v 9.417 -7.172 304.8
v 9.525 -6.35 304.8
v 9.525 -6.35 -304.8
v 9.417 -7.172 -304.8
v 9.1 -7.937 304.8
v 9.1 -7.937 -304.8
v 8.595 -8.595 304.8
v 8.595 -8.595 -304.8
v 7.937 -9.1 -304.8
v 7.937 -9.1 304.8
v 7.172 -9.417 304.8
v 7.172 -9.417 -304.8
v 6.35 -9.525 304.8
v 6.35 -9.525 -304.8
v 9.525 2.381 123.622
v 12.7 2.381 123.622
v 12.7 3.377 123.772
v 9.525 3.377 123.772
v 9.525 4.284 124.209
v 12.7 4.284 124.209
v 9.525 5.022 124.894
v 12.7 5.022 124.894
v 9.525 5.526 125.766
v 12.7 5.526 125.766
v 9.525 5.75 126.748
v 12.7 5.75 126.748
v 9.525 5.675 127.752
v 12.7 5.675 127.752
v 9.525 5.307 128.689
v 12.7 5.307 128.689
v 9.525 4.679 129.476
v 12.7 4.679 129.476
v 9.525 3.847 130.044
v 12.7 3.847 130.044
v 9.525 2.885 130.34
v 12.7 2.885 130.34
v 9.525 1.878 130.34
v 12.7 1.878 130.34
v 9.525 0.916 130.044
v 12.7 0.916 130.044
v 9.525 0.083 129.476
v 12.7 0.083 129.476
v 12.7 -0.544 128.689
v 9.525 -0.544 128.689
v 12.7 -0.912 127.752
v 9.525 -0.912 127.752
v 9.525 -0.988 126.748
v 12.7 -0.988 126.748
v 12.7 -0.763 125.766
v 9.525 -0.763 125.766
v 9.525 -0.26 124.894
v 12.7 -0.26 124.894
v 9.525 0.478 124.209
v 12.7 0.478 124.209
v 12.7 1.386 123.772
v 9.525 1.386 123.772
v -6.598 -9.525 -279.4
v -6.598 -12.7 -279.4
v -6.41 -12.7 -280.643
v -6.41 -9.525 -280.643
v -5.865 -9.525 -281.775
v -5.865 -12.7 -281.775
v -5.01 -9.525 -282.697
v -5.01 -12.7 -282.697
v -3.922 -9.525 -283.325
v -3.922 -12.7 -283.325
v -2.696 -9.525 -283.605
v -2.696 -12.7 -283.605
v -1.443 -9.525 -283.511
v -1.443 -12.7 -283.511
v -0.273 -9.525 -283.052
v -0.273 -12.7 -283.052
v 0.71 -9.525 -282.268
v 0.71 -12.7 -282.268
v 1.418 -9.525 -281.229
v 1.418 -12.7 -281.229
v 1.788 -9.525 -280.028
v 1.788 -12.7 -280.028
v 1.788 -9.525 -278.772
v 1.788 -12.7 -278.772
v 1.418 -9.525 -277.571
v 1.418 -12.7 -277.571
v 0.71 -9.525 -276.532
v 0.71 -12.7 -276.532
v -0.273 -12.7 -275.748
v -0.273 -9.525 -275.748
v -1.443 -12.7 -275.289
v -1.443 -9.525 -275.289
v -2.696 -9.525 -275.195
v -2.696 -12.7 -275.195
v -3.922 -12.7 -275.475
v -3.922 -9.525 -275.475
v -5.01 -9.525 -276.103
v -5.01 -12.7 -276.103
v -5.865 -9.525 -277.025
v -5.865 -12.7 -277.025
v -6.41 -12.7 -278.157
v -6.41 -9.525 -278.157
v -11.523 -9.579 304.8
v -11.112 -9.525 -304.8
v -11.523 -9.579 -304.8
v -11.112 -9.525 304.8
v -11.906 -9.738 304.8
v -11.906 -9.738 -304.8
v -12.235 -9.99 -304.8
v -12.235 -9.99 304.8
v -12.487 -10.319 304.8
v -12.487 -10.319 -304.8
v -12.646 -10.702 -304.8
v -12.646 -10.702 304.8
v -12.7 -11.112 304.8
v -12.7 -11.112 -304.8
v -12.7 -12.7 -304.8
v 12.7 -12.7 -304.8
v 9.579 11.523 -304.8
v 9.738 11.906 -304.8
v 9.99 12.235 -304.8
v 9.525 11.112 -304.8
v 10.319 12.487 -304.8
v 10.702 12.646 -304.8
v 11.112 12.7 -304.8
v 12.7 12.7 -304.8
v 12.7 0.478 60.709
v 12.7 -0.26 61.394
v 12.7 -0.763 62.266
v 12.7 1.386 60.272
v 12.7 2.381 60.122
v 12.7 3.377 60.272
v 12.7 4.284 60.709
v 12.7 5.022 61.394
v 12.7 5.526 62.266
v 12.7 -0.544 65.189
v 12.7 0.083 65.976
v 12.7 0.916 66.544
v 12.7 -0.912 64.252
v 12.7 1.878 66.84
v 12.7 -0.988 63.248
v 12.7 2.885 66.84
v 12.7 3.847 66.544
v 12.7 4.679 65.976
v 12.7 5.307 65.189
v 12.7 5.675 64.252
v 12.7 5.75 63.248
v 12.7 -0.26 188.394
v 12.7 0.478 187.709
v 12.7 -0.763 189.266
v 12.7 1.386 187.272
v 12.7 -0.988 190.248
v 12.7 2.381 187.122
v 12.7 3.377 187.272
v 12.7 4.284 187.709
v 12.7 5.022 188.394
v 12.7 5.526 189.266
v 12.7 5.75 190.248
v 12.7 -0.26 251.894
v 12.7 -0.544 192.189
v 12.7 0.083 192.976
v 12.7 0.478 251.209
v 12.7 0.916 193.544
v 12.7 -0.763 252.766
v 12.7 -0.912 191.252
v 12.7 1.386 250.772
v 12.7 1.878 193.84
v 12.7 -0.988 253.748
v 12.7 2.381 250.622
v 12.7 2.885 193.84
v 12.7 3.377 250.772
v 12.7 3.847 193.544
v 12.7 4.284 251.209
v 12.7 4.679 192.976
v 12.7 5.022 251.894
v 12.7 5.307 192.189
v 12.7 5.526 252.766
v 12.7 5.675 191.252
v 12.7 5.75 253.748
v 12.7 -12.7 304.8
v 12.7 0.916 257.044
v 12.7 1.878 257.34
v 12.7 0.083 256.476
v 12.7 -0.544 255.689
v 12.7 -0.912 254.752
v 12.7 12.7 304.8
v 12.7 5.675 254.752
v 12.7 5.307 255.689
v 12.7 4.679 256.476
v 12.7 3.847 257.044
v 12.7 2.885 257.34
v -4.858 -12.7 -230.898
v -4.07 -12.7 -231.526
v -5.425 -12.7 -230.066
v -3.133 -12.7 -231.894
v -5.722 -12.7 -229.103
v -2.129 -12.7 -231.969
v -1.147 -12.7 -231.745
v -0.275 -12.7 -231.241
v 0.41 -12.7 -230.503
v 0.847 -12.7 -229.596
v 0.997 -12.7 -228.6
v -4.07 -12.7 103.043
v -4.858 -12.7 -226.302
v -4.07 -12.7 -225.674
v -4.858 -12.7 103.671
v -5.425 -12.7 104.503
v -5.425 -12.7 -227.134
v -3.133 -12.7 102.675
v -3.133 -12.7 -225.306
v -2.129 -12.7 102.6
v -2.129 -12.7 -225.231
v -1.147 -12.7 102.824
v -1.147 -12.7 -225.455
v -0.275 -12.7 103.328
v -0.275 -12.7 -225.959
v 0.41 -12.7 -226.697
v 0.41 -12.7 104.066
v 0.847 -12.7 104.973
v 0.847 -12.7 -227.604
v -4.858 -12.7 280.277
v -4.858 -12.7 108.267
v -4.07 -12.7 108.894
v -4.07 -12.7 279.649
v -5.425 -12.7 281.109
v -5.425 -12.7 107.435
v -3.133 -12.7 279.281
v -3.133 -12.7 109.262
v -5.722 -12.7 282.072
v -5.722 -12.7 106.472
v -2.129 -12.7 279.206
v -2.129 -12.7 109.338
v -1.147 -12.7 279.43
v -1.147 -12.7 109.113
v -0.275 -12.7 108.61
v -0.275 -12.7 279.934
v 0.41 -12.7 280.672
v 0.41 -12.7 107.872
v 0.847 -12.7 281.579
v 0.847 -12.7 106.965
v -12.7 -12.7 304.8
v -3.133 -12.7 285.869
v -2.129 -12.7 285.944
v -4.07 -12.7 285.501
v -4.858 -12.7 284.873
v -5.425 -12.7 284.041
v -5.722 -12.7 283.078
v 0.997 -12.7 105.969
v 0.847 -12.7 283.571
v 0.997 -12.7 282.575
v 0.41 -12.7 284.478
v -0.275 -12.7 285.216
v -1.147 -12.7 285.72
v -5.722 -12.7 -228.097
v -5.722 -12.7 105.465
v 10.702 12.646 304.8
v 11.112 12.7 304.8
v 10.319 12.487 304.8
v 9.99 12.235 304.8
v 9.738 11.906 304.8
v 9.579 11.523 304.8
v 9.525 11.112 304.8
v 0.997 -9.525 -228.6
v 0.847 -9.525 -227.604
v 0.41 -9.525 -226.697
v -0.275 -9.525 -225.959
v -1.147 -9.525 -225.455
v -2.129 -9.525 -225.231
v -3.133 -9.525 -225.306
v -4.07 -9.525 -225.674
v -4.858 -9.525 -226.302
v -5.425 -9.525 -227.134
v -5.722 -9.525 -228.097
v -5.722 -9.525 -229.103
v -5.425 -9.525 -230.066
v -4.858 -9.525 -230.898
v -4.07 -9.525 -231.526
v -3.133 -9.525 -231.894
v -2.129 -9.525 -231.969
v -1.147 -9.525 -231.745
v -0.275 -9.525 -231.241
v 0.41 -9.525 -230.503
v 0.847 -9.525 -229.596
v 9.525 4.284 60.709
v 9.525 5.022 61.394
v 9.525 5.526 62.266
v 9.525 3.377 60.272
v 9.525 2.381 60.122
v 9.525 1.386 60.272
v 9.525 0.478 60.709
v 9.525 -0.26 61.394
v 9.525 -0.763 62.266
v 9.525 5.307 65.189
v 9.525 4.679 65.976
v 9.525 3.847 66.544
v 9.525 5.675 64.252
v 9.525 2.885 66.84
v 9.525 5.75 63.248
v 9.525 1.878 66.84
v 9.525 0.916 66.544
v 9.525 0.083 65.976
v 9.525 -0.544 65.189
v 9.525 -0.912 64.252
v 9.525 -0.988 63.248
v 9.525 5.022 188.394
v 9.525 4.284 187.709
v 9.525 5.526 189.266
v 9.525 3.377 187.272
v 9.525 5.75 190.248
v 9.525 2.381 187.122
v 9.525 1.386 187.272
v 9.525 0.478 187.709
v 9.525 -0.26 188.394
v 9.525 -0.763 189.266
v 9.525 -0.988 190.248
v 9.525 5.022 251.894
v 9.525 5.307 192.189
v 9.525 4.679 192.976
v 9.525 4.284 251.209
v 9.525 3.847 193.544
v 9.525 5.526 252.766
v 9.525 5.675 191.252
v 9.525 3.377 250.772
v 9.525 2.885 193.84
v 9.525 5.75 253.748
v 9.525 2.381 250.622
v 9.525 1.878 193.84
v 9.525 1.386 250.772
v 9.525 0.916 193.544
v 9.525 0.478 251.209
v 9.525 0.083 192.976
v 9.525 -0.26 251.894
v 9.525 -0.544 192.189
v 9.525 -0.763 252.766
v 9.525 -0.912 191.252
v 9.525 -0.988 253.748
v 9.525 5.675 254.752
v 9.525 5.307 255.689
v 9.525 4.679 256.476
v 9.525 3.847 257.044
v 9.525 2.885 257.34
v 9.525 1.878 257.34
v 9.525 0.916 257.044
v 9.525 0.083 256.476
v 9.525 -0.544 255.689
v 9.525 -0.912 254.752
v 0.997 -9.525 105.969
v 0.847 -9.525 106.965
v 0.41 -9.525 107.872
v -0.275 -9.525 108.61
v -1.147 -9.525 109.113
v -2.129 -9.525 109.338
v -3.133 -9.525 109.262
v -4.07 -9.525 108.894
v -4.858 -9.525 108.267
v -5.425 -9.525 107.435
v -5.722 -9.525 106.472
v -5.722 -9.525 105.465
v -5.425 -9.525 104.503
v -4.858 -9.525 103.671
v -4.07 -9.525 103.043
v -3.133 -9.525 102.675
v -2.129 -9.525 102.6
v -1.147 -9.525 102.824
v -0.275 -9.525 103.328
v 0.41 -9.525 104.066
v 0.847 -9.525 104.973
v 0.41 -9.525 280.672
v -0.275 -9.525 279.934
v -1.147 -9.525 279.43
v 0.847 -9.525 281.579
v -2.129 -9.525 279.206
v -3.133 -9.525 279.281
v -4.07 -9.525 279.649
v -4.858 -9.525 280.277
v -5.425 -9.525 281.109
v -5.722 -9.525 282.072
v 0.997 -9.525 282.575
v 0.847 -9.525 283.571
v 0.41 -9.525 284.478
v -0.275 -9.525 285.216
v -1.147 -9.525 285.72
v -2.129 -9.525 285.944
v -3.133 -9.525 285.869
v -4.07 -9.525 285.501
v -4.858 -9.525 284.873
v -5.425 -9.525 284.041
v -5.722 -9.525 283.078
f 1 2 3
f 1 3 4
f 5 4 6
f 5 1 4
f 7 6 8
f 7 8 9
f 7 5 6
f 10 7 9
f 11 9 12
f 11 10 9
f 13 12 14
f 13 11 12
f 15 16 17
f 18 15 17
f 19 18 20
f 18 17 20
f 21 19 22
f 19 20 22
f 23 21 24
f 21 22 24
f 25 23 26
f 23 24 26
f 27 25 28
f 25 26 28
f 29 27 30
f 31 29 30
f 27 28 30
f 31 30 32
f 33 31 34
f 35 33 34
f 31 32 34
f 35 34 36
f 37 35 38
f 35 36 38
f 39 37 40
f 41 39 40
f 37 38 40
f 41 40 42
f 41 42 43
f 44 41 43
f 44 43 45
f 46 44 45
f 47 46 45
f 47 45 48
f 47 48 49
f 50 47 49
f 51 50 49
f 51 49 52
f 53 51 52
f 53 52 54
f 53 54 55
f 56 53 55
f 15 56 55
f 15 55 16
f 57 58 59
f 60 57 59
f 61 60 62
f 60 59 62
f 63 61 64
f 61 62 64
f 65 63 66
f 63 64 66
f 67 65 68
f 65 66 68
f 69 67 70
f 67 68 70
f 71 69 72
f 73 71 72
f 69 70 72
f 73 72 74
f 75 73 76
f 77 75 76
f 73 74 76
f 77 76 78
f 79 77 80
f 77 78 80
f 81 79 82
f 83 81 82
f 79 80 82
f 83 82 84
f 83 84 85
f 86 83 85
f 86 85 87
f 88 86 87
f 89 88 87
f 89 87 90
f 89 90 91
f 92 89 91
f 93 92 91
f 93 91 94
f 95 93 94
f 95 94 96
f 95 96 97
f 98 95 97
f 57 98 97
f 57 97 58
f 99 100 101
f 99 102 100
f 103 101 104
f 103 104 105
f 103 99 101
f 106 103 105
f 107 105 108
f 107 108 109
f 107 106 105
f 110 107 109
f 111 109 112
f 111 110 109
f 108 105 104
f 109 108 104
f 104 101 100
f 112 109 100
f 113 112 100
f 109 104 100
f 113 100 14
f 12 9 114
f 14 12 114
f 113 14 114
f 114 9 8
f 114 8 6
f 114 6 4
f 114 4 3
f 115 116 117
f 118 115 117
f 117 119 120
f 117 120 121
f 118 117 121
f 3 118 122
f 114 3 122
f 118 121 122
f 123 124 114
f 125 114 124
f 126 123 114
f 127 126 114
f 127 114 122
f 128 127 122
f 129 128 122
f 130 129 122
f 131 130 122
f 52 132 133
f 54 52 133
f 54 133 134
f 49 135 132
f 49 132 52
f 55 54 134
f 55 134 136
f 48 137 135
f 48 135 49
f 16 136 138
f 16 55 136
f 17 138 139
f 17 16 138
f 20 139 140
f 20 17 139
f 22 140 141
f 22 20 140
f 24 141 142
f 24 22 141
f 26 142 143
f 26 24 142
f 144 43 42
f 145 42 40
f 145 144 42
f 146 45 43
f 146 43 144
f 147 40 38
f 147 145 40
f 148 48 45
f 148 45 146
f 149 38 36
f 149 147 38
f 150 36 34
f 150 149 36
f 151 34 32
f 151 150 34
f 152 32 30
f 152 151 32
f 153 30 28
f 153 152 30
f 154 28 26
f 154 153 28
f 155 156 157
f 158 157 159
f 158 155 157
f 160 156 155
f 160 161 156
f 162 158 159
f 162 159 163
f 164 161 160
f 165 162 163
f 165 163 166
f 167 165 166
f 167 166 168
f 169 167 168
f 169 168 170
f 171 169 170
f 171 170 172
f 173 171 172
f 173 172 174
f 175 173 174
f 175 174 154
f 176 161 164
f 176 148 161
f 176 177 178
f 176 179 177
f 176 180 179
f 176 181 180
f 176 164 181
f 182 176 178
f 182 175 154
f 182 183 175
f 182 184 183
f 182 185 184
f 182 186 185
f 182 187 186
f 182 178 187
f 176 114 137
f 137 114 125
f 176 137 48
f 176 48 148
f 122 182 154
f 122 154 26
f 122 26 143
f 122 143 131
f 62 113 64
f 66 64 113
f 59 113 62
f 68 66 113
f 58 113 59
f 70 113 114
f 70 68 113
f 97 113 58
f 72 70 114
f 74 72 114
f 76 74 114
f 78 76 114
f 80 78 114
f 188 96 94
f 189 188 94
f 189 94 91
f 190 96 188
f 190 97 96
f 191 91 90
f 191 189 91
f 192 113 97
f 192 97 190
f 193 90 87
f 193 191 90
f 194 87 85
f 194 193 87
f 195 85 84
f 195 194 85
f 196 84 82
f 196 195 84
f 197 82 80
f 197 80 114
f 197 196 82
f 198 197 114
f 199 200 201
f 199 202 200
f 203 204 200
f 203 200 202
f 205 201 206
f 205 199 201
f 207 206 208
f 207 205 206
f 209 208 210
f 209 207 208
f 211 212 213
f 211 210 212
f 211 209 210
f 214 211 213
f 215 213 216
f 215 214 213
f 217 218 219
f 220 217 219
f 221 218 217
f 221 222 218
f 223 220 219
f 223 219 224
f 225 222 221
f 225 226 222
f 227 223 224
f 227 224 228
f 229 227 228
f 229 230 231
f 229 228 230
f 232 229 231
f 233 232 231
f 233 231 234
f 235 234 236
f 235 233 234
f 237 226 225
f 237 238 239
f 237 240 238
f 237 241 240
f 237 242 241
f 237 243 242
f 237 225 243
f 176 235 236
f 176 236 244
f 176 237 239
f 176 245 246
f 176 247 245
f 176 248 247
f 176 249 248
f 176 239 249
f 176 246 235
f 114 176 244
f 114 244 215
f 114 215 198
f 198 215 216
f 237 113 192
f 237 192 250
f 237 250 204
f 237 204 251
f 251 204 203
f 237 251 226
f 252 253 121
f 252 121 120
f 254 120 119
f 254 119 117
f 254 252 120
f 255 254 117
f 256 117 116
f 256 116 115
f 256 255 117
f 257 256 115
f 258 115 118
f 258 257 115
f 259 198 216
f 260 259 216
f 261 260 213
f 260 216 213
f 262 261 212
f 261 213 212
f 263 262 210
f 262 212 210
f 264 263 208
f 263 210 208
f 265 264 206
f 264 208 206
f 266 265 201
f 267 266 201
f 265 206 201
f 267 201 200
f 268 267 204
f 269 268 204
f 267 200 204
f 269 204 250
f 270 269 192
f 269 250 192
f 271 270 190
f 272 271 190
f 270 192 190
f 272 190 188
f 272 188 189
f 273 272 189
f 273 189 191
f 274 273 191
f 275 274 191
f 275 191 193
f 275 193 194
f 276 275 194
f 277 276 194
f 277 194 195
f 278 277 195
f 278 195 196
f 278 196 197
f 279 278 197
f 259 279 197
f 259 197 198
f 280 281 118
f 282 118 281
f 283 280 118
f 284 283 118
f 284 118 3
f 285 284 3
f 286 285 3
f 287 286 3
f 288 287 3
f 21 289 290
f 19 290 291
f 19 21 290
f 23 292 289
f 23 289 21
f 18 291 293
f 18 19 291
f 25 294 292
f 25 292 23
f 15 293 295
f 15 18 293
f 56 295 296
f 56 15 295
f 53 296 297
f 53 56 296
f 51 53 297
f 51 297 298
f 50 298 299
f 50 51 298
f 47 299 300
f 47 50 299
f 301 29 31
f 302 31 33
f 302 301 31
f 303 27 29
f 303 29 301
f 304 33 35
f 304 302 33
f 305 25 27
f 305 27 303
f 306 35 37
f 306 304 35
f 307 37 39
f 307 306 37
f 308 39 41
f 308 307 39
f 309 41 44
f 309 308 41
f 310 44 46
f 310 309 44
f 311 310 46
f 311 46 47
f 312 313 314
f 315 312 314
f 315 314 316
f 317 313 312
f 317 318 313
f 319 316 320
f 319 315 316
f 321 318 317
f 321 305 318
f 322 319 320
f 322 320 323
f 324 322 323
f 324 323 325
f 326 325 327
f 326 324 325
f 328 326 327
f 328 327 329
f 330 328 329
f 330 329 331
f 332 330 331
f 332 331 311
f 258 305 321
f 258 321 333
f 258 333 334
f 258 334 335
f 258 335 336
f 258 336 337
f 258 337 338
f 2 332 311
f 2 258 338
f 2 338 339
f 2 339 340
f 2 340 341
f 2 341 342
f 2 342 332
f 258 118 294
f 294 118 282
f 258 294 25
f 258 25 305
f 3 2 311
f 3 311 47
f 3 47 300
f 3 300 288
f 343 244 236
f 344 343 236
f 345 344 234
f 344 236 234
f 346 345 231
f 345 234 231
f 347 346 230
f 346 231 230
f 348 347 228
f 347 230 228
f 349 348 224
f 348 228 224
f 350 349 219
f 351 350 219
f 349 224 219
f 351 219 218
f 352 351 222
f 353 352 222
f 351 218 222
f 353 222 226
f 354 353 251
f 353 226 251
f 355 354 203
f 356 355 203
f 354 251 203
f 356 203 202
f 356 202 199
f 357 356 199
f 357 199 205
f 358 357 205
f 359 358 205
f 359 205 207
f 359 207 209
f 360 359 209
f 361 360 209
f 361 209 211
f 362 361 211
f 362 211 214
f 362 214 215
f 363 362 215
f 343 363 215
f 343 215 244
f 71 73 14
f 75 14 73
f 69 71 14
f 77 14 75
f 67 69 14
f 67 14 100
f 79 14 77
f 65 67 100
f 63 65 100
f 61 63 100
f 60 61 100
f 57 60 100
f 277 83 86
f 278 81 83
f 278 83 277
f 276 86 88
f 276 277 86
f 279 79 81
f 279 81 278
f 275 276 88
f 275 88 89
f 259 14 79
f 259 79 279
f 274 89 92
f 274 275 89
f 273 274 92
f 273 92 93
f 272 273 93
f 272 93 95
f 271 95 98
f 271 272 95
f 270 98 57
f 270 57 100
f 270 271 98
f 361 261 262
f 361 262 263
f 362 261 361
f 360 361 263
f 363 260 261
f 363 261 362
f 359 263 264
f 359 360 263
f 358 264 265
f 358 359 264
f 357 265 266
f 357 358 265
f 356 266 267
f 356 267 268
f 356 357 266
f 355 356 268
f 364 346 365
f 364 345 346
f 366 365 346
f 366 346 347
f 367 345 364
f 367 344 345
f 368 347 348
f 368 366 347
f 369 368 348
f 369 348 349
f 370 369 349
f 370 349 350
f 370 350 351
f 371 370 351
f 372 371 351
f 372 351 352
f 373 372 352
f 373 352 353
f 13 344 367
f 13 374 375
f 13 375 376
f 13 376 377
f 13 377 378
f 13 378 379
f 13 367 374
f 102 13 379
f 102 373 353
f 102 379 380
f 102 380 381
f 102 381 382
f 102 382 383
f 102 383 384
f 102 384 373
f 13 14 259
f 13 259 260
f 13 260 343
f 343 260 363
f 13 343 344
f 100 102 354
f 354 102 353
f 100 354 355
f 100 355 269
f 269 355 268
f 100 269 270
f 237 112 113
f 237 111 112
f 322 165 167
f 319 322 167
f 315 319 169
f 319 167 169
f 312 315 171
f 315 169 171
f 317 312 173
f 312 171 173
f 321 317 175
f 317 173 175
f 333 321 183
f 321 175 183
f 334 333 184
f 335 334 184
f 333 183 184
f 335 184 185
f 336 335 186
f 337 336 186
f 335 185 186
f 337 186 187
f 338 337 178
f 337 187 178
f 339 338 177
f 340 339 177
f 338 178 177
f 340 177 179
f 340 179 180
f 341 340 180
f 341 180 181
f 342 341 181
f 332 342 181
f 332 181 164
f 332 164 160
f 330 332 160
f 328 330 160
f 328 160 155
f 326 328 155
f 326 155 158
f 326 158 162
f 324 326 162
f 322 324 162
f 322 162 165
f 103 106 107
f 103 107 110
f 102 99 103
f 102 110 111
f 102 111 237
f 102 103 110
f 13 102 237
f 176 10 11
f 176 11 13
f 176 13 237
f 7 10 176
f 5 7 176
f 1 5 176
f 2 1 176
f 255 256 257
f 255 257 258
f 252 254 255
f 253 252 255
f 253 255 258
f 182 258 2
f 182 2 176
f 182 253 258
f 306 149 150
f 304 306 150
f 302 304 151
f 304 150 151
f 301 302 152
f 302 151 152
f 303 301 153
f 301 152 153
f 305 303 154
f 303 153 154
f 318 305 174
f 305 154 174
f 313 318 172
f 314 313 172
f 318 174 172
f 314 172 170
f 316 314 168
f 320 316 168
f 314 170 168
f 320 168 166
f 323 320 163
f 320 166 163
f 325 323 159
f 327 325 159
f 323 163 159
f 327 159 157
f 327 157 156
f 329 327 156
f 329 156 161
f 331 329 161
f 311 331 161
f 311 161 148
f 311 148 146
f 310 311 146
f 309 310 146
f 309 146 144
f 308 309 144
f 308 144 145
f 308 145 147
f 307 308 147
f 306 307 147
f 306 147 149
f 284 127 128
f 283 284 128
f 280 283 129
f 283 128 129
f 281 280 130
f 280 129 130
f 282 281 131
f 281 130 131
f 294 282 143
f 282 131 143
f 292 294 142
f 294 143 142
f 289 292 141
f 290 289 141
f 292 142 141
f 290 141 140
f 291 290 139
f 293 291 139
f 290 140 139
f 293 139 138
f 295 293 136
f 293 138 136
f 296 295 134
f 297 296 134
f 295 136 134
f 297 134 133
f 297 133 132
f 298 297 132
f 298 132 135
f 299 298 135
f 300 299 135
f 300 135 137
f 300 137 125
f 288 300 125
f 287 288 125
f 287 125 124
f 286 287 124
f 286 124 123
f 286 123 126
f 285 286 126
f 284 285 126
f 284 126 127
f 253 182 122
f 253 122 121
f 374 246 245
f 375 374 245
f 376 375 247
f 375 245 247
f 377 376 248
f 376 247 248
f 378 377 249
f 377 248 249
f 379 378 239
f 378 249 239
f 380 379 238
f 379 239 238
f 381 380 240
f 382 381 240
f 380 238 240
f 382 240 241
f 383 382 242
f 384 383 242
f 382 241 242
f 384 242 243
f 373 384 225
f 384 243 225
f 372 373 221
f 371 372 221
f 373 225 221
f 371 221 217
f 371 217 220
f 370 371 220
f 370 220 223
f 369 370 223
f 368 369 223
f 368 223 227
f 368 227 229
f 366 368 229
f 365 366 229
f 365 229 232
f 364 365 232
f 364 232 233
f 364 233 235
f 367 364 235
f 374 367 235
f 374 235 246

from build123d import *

# Parameters (mm, degrees)
BOSS_EXTRUDE1_DEPTH      = 304.8
F_1_4_CLEARANCE_HOLE1_D  = 6.7564
F_1_4_CLEARANCE_HOLE2_D  = 6.7564
F_5_16_CLEARANCE_HOLE1_D = 8.4328


with BuildPart() as part:
    # Sketch2 → Boss-Extrude1 (new, symmetric)
    with BuildSketch(Plane.XY):
        with BuildLine():
            Line((-12.7, -12.7), (12.7, -12.7))
            Line((12.7, -12.7), (12.7, 12.7))
            Line((12.7, 12.7), (11.1125, 12.7))
            ThreePointArc((11.1125, 12.7), (9.989967985, 12.235032015), (9.525, 11.1125))
            Line((9.525, 11.1125), (9.525, -6.35))
            ThreePointArc((9.525, -6.35), (8.59506403, -8.59506403), (6.35, -9.525))
            Line((6.35, -9.525), (-11.1125, -9.525))
            ThreePointArc((-11.1125, -9.525), (-12.235032015, -9.989967985), (-12.7, -11.1125))
            Line((-12.7, -11.1125), (-12.7, -12.7))
        make_face()
    extrude(amount=BOSS_EXTRUDE1_DEPTH, both=True)

    # 1/4 Clearance Hole1 (through all)
    with Locations(Plane(origin=(0, -9.525, 0), x_dir=(-1, 0, 0), z_dir=(0, 1, 0))):
        with Locations((2.38125, 282.575), (2.38125, -228.6), (2.38125, 105.9688)):
            Hole(F_1_4_CLEARANCE_HOLE1_D / 2)

    # 1/4 Clearance Hole2 (through all)
    with Locations(Plane.ZY.offset(-9.525)):
        with Locations((254, 2.38125), (190.5, 2.38125), (127, 2.38125), (63.5, 2.38125)):
            Hole(F_1_4_CLEARANCE_HOLE2_D / 2)

    # 5/16 Clearance Hole1 (through all)
    with Locations(Plane(origin=(0, -9.525, 0), x_dir=(1, 0, 0), z_dir=(0, 1, 0))):
        with Locations((-2.38125, 279.4)):
            Hole(F_5_16_CLEARANCE_HOLE1_D / 2)


solid = part.part
